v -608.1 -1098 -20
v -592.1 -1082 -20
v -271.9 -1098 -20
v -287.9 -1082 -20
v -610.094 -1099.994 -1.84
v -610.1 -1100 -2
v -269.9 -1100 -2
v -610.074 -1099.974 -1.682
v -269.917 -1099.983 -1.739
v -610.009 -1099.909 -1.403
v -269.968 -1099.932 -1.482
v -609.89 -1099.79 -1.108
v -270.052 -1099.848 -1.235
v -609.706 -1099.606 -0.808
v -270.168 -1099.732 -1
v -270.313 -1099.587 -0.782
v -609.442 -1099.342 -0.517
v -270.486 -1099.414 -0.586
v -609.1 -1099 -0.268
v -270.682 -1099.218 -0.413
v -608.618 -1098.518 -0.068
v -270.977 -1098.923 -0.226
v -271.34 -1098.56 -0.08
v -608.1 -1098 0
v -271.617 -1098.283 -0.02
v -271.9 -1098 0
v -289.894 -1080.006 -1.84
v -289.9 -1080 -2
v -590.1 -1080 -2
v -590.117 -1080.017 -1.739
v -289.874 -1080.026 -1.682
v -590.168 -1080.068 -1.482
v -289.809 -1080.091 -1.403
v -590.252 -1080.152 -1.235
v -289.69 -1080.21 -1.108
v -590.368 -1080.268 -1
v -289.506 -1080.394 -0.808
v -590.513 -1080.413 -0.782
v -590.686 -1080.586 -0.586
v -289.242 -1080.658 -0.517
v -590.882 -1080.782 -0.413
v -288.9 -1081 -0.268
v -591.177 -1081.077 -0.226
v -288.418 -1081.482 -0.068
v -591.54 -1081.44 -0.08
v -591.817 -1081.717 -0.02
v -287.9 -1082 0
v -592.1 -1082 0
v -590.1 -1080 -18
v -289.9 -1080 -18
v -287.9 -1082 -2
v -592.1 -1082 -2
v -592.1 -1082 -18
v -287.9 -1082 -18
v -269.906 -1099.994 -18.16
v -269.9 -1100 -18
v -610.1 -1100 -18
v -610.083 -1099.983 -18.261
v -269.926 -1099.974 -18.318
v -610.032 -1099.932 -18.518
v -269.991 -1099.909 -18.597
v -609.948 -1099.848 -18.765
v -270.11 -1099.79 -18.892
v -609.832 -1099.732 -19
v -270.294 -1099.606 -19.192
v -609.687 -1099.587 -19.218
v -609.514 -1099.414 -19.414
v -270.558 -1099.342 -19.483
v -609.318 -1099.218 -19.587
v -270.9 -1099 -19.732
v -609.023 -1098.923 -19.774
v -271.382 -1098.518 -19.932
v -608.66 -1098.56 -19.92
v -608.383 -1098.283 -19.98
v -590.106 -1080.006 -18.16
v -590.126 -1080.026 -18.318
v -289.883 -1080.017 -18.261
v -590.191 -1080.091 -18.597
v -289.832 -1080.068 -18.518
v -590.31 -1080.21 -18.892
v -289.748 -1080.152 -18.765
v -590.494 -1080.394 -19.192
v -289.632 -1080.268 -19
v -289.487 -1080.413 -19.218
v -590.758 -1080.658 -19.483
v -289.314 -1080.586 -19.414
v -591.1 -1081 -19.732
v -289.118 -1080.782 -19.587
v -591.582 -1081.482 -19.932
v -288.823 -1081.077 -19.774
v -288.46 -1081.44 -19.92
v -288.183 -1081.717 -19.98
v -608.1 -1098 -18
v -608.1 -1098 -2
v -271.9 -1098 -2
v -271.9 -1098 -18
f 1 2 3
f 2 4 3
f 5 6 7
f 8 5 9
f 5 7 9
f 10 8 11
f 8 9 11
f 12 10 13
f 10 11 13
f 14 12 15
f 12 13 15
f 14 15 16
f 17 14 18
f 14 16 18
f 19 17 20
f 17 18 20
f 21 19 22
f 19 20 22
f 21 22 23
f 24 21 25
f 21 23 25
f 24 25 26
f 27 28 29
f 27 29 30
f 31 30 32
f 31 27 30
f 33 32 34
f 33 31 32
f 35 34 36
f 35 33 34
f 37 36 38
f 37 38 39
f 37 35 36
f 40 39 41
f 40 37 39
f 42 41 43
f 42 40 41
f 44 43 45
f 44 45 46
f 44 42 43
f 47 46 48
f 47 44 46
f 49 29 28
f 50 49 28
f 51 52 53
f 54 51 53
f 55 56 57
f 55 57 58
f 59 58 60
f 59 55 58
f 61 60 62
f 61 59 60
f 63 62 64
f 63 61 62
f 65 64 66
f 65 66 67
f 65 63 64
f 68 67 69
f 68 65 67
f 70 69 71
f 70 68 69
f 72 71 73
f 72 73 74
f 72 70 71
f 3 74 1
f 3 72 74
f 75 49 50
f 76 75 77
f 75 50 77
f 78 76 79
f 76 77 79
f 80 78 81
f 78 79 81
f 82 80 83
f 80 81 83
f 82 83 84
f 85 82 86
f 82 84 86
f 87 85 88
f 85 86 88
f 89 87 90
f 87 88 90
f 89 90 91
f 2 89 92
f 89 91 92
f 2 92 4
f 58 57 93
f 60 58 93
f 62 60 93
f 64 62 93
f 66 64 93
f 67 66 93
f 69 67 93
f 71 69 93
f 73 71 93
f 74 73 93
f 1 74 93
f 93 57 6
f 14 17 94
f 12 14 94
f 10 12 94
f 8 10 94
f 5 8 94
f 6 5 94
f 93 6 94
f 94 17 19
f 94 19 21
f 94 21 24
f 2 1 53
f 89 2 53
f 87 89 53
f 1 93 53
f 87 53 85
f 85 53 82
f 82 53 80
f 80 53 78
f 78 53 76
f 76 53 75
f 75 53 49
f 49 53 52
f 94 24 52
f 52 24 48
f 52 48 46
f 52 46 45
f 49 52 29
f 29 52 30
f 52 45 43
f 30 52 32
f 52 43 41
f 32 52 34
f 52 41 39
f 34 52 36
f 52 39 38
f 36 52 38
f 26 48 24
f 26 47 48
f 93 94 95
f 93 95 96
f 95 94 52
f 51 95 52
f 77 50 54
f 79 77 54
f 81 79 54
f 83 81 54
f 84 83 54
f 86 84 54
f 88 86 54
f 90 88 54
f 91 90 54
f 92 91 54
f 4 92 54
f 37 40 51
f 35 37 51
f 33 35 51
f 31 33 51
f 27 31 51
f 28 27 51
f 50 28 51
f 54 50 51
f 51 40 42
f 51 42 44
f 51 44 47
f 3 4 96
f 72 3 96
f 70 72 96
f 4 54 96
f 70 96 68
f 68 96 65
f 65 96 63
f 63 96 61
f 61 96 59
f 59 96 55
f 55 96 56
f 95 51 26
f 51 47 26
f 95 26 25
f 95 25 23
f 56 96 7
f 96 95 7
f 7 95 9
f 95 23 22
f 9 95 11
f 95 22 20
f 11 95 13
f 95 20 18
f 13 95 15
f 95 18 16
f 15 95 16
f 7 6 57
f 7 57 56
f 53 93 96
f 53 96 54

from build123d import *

# Parameters (mm, degrees)
SKETCH1_W           = 340.2
SKETCH1_H           = 20
BOSS_EXTRUDE1_DEPTH = 20
FILLET1_R           = 2
CUT_EXTRUDE1_DEPTH  = 21
SKETCH3_W           = 16
SKETCH3_H           = 16
CUT_EXTRUDE2_DEPTH  = 611.1


with BuildPart() as part:
    # Sketch1 → Boss-Extrude1 (new body)
    with BuildSketch(Plane.XY):
        with Locations((-440, -1090)):
            Rectangle(SKETCH1_W, SKETCH1_H)
    extrude(amount=-BOSS_EXTRUDE1_DEPTH)

    # Fillet1
    fillet1_edges = [part.edges().sort_by_distance(p)[0] for p in [
        (-440, -1100, -20),
        (-440, -1100, 0),
        (-440, -1080, 0),
        (-440, -1080, -20),
    ]]
    fillet(fillet1_edges, radius=FILLET1_R)

    # Sketch2 → Cut-Extrude1 (cut, through all)
    with BuildSketch(Plane.XY):
        Polygon((-269.9, -1100), (-269.9, -1080), (-289.9, -1080), align=None)
        Polygon((-610.1, -1100), (-590.1, -1080), (-610.1, -1080), align=None)
    extrude(amount=-CUT_EXTRUDE1_DEPTH, mode=Mode.SUBTRACT)

    # Sketch3 → Cut-Extrude2 (cut, through all)
    with BuildSketch(Plane(origin=(0, 0, 0), x_dir=(0, 0, -1), z_dir=(1, 0, 0))):
        with Locations((10, -1090)):
            Rectangle(SKETCH3_W, SKETCH3_H)
    extrude(amount=-CUT_EXTRUDE2_DEPTH, mode=Mode.SUBTRACT)


solid = part.part
